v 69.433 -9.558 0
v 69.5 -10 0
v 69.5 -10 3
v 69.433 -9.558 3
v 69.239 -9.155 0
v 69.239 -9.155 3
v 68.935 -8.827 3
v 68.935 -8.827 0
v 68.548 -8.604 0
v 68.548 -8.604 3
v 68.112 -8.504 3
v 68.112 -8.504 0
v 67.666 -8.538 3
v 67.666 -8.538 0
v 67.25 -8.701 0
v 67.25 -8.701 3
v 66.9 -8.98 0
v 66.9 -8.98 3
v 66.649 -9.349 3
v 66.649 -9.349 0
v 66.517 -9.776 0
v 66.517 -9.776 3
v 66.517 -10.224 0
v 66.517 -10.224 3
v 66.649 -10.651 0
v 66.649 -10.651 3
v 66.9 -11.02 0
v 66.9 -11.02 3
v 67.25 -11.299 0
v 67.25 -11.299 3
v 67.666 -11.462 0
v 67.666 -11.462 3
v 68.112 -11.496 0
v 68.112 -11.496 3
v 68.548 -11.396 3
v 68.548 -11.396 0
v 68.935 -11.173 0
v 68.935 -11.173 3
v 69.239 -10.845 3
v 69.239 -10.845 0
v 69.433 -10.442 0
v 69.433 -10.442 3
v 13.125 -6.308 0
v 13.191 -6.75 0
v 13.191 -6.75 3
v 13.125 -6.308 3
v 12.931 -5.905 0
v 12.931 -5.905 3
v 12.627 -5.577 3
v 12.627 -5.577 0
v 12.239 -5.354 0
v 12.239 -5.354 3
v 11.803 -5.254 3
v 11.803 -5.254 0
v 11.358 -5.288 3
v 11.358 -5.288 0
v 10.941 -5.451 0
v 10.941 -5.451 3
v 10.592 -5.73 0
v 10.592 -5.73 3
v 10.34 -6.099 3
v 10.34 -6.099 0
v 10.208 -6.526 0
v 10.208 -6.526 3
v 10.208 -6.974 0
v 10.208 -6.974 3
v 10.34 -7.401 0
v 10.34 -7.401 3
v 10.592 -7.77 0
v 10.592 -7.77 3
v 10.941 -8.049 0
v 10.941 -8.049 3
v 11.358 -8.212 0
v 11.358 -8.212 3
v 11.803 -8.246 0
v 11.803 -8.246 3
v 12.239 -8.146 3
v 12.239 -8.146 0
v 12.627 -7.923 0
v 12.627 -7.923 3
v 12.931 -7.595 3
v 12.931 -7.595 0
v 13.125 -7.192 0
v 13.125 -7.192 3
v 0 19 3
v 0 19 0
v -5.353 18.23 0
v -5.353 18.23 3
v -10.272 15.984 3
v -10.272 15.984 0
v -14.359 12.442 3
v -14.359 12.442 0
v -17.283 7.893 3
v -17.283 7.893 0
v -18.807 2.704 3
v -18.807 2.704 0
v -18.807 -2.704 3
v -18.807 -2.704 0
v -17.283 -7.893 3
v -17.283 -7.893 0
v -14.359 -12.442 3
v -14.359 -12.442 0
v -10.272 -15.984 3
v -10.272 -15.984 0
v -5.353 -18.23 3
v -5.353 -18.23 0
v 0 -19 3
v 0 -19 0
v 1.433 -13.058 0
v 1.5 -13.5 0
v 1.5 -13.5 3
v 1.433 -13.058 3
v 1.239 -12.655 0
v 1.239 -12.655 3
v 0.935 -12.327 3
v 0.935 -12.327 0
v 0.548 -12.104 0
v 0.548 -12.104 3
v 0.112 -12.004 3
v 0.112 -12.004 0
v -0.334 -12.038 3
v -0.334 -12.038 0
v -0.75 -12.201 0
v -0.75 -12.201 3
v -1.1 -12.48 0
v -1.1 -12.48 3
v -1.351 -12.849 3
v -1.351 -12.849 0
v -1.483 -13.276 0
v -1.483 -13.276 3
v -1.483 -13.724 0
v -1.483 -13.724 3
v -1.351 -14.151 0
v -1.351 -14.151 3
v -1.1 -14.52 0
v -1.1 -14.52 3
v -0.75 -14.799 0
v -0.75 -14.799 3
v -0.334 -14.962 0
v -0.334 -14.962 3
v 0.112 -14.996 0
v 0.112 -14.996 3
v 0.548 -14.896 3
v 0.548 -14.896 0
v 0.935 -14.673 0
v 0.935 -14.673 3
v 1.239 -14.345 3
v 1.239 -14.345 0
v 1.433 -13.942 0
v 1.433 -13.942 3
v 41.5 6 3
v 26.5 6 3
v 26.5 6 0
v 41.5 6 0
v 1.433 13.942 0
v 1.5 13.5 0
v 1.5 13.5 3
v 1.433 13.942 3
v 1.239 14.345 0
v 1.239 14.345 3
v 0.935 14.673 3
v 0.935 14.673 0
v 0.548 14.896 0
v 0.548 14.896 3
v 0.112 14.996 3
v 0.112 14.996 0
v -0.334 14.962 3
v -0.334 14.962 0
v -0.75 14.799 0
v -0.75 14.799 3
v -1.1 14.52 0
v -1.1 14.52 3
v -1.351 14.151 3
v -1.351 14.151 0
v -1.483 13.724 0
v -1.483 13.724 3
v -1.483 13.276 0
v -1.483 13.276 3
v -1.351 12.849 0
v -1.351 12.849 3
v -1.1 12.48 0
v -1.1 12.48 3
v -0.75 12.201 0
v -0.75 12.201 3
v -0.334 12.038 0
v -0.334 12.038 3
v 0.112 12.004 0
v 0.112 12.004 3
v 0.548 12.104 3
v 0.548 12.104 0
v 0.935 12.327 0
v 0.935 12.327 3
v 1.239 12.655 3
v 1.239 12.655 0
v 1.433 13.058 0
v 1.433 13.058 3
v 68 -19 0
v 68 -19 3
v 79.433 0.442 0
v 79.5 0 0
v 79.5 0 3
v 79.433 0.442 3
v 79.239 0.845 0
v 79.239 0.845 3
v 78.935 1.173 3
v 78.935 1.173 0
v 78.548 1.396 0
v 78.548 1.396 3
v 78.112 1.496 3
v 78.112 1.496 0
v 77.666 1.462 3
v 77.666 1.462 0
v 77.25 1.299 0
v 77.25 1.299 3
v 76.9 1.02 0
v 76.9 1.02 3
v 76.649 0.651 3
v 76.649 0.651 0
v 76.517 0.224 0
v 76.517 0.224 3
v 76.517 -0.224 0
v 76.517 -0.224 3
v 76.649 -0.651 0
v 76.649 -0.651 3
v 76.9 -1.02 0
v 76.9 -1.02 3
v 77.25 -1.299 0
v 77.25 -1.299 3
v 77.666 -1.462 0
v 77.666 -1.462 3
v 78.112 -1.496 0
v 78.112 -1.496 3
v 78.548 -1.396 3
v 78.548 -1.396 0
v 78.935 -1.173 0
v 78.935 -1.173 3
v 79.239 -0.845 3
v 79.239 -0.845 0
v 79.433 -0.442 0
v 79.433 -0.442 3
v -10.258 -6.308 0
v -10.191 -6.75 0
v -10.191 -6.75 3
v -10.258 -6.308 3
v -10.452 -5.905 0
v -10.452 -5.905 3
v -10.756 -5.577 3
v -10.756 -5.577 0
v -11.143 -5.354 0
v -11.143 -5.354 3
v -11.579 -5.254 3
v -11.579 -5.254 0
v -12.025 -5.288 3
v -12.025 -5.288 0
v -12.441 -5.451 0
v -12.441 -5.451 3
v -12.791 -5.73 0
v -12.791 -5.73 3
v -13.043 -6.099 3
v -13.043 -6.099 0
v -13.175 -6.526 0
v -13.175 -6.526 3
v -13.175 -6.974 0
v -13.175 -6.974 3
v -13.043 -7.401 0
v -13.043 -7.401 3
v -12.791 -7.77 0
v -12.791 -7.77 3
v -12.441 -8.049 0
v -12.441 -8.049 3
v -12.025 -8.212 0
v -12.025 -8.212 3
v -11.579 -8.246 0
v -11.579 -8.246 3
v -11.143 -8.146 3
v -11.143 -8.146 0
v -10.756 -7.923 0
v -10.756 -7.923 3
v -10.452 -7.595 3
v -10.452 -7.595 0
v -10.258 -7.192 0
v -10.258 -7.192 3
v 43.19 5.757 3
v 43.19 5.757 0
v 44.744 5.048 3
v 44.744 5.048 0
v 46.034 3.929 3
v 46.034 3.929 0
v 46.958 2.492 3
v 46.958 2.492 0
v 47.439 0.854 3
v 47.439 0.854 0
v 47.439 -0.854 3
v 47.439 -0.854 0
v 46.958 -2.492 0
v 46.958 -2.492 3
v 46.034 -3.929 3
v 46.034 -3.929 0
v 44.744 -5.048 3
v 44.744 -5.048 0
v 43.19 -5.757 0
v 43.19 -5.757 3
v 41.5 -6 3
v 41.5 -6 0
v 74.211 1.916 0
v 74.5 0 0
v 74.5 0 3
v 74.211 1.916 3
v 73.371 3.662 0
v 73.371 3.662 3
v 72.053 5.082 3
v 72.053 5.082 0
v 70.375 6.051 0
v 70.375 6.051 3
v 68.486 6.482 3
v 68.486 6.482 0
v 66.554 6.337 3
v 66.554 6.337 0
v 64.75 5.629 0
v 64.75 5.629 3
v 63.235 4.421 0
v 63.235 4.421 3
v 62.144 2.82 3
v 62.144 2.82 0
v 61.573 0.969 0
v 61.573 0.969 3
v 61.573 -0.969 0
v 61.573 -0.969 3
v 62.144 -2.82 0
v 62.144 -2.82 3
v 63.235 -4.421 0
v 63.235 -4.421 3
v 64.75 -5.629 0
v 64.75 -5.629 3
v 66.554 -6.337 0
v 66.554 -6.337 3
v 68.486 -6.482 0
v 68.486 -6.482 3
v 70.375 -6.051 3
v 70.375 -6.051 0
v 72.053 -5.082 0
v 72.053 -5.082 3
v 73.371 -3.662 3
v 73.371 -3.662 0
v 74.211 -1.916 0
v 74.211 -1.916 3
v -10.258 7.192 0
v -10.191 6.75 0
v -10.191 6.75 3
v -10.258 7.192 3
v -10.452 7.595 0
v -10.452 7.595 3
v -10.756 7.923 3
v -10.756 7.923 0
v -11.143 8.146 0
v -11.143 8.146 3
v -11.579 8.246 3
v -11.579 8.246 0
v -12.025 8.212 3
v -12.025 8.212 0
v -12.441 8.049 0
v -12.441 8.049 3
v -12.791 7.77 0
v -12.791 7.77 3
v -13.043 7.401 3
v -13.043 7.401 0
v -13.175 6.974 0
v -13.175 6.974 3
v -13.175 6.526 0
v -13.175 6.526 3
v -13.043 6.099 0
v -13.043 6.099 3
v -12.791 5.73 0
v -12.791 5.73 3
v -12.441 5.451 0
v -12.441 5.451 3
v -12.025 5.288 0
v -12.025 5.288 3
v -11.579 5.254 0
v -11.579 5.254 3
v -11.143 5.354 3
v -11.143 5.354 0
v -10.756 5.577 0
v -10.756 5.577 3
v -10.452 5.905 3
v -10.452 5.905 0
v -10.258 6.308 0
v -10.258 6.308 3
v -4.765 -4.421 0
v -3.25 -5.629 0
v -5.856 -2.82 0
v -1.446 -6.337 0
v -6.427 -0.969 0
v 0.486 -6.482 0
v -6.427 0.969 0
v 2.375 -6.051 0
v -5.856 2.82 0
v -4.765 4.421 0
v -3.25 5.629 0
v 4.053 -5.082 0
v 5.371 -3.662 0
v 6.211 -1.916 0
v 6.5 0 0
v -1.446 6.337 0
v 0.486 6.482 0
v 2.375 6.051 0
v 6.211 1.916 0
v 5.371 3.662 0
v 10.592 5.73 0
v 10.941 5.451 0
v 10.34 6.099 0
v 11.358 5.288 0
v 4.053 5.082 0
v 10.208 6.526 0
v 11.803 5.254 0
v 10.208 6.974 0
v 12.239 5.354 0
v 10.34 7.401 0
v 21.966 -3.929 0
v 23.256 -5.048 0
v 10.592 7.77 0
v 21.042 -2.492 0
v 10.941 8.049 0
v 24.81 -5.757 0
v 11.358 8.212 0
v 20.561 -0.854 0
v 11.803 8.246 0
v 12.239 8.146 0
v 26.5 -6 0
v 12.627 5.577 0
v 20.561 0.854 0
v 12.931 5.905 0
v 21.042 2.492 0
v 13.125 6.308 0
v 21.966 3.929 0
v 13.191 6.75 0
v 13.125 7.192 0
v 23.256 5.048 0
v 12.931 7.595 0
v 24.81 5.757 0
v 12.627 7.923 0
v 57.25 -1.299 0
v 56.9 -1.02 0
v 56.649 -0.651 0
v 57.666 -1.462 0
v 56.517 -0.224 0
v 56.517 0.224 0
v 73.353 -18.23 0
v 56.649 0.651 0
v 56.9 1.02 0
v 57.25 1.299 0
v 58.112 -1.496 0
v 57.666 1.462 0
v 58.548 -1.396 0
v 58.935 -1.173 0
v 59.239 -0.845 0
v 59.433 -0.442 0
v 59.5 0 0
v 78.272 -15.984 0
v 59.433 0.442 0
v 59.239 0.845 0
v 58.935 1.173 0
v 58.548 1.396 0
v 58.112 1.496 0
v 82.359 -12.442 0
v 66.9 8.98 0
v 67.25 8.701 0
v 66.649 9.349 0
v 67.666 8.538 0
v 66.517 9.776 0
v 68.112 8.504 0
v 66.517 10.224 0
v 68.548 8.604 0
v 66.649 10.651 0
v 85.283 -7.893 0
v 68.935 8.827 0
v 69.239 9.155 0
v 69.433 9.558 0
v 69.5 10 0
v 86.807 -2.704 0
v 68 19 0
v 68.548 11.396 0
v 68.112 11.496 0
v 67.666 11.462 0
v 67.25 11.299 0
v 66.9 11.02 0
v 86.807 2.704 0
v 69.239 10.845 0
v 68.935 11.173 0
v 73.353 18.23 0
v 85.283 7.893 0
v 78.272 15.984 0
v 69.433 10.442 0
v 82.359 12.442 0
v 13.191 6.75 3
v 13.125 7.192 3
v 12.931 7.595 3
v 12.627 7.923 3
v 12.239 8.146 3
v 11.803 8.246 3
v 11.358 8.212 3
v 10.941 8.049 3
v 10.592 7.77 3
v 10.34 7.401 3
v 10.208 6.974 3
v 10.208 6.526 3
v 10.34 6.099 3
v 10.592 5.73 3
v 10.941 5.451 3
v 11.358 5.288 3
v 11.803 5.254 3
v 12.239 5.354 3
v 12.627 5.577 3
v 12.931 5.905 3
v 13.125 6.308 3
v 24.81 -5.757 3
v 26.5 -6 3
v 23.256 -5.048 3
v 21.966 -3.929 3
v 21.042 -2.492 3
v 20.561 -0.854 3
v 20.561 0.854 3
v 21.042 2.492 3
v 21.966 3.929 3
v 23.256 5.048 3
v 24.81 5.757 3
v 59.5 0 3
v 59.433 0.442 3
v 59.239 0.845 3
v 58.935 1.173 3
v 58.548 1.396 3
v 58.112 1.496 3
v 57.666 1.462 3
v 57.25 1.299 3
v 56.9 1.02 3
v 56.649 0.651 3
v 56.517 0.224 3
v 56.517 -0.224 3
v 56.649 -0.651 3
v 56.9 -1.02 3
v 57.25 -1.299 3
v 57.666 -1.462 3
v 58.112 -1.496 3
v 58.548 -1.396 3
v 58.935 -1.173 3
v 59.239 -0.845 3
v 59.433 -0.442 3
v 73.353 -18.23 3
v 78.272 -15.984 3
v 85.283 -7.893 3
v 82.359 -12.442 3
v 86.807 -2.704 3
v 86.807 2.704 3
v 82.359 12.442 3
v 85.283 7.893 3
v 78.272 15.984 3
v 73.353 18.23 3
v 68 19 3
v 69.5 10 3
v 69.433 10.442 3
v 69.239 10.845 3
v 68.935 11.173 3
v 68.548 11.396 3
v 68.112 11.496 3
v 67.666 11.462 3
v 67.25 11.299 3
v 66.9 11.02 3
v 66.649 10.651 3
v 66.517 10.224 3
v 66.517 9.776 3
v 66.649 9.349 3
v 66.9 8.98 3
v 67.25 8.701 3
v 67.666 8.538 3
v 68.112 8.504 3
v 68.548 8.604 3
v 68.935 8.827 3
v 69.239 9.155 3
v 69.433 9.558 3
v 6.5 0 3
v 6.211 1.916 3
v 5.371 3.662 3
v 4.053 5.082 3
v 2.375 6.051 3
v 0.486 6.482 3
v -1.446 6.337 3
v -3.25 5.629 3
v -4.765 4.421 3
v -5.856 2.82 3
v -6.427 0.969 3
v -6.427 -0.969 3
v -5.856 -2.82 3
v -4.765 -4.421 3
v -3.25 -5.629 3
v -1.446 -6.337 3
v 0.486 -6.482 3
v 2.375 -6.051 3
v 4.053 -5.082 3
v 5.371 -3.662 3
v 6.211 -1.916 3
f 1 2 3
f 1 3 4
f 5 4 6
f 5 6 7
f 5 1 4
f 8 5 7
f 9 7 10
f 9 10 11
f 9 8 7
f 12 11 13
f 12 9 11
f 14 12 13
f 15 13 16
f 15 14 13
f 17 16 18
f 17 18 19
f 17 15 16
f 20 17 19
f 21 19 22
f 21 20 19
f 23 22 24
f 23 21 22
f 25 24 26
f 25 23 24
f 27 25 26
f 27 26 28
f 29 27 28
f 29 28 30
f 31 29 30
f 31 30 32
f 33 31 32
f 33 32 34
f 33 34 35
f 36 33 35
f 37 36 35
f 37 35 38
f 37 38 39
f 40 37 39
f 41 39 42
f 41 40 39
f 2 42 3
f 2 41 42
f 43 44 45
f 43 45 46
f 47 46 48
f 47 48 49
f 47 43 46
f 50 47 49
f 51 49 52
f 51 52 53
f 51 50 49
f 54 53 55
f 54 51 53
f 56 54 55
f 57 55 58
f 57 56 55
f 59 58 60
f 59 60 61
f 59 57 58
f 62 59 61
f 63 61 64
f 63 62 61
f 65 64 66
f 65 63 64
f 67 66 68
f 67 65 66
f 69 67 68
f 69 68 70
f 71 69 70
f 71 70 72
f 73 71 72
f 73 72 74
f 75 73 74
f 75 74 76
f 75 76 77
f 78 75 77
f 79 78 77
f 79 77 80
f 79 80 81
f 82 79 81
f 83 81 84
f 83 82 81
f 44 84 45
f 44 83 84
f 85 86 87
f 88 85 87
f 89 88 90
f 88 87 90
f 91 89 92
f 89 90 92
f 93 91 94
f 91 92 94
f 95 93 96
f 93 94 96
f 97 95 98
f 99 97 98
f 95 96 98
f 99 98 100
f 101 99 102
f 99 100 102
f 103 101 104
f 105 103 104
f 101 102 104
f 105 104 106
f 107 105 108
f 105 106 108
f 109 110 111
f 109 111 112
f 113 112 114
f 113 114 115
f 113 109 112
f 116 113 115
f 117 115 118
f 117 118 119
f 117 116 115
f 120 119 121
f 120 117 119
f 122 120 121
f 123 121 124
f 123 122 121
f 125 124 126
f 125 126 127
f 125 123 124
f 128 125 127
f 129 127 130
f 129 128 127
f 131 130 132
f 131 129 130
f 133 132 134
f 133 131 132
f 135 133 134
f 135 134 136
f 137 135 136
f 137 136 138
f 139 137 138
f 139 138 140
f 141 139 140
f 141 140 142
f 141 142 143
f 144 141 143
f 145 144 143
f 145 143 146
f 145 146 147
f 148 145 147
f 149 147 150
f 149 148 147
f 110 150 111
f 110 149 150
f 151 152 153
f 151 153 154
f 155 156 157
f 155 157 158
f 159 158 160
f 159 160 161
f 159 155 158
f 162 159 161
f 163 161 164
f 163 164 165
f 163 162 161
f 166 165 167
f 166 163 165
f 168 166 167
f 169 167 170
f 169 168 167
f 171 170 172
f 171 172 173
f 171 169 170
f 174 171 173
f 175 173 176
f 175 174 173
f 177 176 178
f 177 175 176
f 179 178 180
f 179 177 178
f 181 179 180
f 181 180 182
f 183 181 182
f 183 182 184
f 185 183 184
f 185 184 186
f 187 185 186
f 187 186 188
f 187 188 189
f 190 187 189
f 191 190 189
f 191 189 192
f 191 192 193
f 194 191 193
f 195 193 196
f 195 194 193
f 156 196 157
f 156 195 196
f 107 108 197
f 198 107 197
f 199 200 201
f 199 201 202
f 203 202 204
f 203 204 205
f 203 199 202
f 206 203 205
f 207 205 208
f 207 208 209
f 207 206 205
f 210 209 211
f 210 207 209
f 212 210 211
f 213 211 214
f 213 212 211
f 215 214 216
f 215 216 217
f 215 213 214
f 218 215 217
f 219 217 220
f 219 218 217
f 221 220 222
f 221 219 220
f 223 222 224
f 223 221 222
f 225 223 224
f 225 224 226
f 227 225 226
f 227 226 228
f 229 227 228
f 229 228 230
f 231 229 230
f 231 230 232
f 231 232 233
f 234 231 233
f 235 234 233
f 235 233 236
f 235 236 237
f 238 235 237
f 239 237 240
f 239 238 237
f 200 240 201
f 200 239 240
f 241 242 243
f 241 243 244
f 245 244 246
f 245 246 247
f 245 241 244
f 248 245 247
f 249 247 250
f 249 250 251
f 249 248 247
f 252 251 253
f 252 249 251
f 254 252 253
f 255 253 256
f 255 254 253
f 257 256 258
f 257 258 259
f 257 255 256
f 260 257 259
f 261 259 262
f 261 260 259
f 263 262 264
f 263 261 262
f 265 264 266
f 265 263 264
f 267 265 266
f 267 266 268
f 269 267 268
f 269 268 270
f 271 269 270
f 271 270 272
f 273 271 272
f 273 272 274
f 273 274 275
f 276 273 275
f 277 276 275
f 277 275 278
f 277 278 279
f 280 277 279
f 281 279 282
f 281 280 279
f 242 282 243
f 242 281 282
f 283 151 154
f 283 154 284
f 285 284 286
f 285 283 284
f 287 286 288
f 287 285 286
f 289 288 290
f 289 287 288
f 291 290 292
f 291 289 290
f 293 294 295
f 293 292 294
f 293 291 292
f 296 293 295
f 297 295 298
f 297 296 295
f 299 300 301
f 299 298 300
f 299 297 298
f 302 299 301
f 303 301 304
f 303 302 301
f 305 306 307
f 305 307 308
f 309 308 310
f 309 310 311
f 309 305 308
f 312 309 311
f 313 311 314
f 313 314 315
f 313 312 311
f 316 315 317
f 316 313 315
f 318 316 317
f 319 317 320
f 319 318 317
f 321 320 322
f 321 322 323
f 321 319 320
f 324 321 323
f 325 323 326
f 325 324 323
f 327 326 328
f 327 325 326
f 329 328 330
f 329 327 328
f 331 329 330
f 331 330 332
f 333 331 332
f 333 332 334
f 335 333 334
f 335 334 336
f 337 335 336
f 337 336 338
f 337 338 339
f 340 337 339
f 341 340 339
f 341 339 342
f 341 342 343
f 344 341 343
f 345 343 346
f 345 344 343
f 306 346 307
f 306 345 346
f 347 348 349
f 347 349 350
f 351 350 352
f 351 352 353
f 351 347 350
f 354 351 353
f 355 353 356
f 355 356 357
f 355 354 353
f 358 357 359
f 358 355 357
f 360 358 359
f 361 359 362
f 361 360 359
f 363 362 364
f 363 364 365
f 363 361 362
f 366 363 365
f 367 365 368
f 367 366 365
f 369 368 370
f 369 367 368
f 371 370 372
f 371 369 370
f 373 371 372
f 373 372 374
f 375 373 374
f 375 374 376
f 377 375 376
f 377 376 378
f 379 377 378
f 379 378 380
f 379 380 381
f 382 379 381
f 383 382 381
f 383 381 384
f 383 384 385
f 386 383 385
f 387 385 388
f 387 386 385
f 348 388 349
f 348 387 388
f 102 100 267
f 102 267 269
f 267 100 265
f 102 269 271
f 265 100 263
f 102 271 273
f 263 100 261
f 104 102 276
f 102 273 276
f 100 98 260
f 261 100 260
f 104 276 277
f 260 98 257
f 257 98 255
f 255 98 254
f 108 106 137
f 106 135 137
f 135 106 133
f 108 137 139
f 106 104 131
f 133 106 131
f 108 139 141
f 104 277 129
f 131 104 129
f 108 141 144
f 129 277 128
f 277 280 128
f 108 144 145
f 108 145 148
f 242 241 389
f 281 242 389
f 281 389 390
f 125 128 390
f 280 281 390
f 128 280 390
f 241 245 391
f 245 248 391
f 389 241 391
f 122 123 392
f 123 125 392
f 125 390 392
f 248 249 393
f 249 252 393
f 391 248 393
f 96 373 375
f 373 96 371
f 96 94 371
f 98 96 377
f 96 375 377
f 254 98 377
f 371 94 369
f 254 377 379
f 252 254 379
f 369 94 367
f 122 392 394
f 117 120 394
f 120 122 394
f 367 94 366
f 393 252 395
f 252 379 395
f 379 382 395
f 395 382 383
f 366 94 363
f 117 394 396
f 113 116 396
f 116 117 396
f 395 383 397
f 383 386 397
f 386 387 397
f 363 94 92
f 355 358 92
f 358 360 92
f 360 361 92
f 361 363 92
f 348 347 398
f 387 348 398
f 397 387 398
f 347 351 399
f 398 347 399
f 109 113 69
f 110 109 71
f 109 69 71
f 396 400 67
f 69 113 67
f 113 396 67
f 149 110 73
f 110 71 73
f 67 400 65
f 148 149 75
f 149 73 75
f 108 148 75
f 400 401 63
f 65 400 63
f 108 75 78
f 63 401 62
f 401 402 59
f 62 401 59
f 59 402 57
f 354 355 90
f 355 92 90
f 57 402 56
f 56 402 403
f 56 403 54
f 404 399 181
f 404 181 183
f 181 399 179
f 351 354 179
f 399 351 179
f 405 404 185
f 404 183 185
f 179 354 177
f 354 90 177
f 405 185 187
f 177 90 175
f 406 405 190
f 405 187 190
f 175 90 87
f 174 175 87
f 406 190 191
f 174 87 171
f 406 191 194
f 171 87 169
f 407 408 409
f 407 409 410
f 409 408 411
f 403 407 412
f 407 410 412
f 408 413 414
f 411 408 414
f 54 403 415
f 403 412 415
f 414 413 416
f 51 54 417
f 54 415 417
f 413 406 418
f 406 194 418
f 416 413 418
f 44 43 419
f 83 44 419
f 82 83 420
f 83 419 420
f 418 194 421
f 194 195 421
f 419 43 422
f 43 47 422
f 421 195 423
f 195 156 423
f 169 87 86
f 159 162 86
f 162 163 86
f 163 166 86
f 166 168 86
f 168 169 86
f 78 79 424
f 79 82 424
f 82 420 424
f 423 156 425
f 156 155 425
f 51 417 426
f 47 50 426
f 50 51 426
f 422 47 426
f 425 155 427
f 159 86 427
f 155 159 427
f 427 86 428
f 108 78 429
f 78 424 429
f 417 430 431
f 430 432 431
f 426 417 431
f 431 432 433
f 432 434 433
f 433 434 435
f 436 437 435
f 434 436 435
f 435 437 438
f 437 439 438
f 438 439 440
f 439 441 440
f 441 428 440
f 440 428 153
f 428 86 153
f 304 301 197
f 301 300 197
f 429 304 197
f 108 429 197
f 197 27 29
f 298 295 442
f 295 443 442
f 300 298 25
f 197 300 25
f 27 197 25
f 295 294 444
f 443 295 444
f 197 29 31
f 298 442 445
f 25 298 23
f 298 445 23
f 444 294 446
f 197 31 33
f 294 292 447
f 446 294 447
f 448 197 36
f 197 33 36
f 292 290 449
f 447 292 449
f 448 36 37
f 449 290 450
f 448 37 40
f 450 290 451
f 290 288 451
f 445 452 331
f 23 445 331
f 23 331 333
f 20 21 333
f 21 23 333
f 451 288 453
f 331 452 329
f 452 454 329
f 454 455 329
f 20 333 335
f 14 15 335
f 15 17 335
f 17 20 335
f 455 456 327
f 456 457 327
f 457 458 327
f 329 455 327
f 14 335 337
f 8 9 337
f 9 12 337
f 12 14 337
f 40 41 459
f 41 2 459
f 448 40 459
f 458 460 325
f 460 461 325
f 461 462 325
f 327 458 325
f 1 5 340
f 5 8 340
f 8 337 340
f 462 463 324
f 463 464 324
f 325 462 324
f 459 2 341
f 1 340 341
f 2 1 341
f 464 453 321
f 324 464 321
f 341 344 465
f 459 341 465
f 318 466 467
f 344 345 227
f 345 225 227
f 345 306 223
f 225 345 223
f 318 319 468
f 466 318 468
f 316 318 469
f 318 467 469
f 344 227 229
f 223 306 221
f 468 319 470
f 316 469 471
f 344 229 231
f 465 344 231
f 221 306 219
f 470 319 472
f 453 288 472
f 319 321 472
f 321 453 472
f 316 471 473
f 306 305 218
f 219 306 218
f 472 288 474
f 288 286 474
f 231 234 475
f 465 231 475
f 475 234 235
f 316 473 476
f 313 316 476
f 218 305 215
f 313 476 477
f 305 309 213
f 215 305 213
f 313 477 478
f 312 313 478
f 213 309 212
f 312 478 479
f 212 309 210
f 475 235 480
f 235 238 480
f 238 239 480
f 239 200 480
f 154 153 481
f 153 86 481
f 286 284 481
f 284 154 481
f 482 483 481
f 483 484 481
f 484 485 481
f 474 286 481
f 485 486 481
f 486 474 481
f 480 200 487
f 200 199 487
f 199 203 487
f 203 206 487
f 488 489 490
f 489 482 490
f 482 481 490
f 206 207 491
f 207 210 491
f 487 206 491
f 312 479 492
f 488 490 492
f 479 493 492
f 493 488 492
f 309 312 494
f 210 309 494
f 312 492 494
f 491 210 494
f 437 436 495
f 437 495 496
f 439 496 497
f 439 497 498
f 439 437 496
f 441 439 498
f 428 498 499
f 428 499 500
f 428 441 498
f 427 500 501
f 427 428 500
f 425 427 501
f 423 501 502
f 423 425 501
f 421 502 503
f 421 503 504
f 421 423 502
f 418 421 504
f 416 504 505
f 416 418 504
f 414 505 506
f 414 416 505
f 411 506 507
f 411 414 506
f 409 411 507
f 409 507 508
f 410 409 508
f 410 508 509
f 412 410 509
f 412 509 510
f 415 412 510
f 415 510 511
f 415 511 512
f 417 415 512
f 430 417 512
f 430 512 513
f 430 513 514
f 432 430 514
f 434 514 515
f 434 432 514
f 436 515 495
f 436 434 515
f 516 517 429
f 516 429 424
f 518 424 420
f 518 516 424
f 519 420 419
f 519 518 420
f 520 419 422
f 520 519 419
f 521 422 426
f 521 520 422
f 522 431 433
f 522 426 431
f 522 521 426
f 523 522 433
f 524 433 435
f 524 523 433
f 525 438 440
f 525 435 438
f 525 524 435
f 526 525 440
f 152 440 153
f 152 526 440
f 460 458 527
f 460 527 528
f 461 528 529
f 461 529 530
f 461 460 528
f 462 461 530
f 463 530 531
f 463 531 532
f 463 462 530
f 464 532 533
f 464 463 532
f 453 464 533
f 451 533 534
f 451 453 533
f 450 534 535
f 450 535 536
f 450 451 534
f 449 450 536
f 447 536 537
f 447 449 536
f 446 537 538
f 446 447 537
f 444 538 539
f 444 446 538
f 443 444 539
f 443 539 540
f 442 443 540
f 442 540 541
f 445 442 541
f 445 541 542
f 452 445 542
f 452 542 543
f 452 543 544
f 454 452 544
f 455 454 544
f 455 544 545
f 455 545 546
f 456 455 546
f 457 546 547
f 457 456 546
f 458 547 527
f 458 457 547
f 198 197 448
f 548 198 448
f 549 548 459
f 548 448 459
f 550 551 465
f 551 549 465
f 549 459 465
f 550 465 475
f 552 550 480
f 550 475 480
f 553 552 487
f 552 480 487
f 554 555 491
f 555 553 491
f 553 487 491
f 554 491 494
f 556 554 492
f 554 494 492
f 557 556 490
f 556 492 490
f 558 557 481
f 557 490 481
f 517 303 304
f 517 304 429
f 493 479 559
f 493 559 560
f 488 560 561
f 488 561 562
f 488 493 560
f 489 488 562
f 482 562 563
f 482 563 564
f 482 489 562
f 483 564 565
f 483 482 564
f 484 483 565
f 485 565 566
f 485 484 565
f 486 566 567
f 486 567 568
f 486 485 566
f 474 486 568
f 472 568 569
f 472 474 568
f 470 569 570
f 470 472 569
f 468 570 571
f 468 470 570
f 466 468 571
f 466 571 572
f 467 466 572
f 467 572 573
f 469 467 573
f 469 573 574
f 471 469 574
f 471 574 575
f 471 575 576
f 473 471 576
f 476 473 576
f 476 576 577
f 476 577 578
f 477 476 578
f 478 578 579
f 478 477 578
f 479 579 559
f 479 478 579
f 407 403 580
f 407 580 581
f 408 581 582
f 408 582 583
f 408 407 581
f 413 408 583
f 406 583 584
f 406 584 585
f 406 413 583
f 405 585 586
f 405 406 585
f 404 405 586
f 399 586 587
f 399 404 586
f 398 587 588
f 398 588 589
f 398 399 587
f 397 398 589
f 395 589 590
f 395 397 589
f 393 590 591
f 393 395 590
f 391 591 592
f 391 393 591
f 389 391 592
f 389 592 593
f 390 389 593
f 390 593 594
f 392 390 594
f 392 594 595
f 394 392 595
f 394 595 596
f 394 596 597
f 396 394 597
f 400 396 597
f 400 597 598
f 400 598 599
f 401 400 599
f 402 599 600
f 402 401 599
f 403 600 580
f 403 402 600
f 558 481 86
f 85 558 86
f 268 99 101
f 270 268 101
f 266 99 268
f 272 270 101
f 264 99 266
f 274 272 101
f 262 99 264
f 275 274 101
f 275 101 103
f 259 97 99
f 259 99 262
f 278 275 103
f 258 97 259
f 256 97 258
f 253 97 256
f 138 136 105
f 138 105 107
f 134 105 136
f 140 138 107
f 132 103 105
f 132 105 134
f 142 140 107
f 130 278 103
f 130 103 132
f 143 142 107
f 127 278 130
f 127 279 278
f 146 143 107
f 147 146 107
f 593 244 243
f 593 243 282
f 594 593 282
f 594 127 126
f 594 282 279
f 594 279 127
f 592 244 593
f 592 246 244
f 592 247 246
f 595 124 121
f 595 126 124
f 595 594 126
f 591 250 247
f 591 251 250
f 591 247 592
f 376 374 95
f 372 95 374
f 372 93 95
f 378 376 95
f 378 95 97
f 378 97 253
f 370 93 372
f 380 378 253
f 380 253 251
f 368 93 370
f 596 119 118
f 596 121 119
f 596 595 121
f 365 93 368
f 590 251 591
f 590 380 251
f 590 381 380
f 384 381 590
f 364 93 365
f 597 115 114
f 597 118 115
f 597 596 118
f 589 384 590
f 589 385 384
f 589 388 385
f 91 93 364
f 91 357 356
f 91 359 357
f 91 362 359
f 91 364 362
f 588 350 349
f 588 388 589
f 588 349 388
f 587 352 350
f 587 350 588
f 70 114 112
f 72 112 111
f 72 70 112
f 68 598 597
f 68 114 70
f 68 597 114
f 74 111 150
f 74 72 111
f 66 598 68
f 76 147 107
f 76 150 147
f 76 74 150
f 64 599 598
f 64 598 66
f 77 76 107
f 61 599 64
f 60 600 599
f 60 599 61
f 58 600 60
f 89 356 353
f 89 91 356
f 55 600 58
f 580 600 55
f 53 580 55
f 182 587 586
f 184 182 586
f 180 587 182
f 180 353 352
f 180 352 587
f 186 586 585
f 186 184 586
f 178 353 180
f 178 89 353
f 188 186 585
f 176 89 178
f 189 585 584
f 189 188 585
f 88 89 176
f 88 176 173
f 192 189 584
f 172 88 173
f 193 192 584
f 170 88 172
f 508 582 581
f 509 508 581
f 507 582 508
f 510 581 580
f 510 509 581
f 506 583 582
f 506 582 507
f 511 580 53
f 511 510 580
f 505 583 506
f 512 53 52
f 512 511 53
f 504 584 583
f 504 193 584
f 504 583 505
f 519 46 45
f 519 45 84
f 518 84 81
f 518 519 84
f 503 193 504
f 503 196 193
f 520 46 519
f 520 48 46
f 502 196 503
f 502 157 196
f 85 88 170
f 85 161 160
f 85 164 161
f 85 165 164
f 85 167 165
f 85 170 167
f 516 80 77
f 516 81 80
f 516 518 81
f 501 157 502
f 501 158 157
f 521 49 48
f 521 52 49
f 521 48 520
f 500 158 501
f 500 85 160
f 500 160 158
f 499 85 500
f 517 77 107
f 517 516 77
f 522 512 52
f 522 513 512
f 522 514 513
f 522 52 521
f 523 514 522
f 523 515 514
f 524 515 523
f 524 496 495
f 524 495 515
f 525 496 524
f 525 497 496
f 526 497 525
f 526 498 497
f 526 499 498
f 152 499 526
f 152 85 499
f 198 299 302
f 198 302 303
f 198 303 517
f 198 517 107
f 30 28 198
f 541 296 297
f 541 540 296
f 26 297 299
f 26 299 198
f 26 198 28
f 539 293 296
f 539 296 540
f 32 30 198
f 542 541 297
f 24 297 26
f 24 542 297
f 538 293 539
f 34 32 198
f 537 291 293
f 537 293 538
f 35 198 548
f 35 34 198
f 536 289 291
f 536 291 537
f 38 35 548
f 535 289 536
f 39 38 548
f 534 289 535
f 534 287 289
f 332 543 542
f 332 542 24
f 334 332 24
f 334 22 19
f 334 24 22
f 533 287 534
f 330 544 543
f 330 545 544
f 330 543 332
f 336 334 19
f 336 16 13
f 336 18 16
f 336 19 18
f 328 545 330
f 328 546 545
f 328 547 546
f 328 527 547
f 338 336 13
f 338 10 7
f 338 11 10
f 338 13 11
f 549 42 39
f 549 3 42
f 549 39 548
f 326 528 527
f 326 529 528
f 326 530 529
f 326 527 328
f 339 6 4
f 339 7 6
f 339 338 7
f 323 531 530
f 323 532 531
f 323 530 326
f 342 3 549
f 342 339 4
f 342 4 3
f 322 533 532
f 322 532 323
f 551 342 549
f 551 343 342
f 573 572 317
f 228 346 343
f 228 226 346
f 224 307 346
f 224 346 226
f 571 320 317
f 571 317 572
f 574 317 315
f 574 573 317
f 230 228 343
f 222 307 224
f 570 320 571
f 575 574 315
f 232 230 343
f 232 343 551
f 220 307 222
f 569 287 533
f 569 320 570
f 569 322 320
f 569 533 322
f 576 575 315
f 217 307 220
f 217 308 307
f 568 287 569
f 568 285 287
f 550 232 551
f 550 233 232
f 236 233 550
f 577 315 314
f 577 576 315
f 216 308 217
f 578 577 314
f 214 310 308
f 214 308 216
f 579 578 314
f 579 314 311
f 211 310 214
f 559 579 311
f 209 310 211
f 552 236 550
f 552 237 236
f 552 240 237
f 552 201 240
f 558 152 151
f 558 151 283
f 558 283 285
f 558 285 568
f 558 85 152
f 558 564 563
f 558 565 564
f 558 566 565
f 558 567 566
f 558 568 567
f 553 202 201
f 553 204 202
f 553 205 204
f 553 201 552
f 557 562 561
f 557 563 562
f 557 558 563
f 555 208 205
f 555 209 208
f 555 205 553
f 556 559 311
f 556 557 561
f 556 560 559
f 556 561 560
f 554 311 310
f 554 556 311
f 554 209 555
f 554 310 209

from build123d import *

# Parameters (mm, degrees)
SKETCH_1_R          = 19
SKETCH_1_R_2        = 1.5
SKETCH_1_R_3        = 6.5
EXTRUDE_1_DEPTH     = 3
SKETCH_2_R          = 6.5
CUT_EXTRUDE_1_DEPTH = 90.101066211


with BuildPart() as part:
    # 草图1 → 凸台-拉伸1 (new body)
    # profile 1 of 3: a face of its own
    with BuildSketch(Plane.XY):
        Circle(SKETCH_1_R)
        with Locations((0, 13.5)):
            Circle(SKETCH_1_R_2, mode=Mode.SUBTRACT)
        with Locations((11.691342951, 6.75)):
            Circle(SKETCH_1_R_2, mode=Mode.SUBTRACT)
        with Locations((11.691342951, -6.75)):
            Circle(SKETCH_1_R_2, mode=Mode.SUBTRACT)
        with Locations((0, -13.5)):
            Circle(SKETCH_1_R_2, mode=Mode.SUBTRACT)
        with Locations((-11.691342951, -6.75)):
            Circle(SKETCH_1_R_2, mode=Mode.SUBTRACT)
        with Locations((-11.691342951, 6.75)):
            Circle(SKETCH_1_R_2, mode=Mode.SUBTRACT)
        Circle(SKETCH_1_R_3, mode=Mode.SUBTRACT)
    # profile 2 of 3: a face of its own
    with BuildSketch(Plane.XY):
        with BuildLine():
            Line((68, 19), (0, 19))
            ThreePointArc((0, 19), (13.435028843, 13.435028843), (19, 0))
            ThreePointArc((19, 0), (13.435028843, -13.435028843), (0, -19))
            Line((0, -19), (68, -19))
            ThreePointArc((68, -19), (49, 0), (68, 19))
        make_face()
    # profile 3 of 3: a face of its own
    with BuildSketch(Plane.XY):
        with Locations((68, 0)):
            Circle(SKETCH_1_R)
        with Locations((68, 0)):
            Circle(SKETCH_1_R_3, mode=Mode.SUBTRACT)
        with Locations((68, 10)):
            Circle(SKETCH_1_R_2, mode=Mode.SUBTRACT)
        with Locations((78, 0)):
            Circle(SKETCH_1_R_2, mode=Mode.SUBTRACT)
        with Locations((68, -10)):
            Circle(SKETCH_1_R_2, mode=Mode.SUBTRACT)
        with Locations((58, 0)):
            Circle(SKETCH_1_R_2, mode=Mode.SUBTRACT)
    extrude(amount=EXTRUDE_1_DEPTH)

    # 草图2 → 切除-拉伸1 (cut, through all)
    with BuildSketch(Plane.XY.offset(3)):
        with Locations((68, 0)):
            Circle(SKETCH_2_R)
        with BuildLine():
            Line((26.5, 6), (41.5, 6))
            ThreePointArc((41.5, 6), (47.5, 0), (41.5, -6))
            Line((41.5, -6), (26.5, -6))
            ThreePointArc((26.5, -6), (20.5, 0), (26.5, 6))
        make_face()
    extrude(amount=-CUT_EXTRUDE_1_DEPTH, mode=Mode.SUBTRACT)


solid = part.part
